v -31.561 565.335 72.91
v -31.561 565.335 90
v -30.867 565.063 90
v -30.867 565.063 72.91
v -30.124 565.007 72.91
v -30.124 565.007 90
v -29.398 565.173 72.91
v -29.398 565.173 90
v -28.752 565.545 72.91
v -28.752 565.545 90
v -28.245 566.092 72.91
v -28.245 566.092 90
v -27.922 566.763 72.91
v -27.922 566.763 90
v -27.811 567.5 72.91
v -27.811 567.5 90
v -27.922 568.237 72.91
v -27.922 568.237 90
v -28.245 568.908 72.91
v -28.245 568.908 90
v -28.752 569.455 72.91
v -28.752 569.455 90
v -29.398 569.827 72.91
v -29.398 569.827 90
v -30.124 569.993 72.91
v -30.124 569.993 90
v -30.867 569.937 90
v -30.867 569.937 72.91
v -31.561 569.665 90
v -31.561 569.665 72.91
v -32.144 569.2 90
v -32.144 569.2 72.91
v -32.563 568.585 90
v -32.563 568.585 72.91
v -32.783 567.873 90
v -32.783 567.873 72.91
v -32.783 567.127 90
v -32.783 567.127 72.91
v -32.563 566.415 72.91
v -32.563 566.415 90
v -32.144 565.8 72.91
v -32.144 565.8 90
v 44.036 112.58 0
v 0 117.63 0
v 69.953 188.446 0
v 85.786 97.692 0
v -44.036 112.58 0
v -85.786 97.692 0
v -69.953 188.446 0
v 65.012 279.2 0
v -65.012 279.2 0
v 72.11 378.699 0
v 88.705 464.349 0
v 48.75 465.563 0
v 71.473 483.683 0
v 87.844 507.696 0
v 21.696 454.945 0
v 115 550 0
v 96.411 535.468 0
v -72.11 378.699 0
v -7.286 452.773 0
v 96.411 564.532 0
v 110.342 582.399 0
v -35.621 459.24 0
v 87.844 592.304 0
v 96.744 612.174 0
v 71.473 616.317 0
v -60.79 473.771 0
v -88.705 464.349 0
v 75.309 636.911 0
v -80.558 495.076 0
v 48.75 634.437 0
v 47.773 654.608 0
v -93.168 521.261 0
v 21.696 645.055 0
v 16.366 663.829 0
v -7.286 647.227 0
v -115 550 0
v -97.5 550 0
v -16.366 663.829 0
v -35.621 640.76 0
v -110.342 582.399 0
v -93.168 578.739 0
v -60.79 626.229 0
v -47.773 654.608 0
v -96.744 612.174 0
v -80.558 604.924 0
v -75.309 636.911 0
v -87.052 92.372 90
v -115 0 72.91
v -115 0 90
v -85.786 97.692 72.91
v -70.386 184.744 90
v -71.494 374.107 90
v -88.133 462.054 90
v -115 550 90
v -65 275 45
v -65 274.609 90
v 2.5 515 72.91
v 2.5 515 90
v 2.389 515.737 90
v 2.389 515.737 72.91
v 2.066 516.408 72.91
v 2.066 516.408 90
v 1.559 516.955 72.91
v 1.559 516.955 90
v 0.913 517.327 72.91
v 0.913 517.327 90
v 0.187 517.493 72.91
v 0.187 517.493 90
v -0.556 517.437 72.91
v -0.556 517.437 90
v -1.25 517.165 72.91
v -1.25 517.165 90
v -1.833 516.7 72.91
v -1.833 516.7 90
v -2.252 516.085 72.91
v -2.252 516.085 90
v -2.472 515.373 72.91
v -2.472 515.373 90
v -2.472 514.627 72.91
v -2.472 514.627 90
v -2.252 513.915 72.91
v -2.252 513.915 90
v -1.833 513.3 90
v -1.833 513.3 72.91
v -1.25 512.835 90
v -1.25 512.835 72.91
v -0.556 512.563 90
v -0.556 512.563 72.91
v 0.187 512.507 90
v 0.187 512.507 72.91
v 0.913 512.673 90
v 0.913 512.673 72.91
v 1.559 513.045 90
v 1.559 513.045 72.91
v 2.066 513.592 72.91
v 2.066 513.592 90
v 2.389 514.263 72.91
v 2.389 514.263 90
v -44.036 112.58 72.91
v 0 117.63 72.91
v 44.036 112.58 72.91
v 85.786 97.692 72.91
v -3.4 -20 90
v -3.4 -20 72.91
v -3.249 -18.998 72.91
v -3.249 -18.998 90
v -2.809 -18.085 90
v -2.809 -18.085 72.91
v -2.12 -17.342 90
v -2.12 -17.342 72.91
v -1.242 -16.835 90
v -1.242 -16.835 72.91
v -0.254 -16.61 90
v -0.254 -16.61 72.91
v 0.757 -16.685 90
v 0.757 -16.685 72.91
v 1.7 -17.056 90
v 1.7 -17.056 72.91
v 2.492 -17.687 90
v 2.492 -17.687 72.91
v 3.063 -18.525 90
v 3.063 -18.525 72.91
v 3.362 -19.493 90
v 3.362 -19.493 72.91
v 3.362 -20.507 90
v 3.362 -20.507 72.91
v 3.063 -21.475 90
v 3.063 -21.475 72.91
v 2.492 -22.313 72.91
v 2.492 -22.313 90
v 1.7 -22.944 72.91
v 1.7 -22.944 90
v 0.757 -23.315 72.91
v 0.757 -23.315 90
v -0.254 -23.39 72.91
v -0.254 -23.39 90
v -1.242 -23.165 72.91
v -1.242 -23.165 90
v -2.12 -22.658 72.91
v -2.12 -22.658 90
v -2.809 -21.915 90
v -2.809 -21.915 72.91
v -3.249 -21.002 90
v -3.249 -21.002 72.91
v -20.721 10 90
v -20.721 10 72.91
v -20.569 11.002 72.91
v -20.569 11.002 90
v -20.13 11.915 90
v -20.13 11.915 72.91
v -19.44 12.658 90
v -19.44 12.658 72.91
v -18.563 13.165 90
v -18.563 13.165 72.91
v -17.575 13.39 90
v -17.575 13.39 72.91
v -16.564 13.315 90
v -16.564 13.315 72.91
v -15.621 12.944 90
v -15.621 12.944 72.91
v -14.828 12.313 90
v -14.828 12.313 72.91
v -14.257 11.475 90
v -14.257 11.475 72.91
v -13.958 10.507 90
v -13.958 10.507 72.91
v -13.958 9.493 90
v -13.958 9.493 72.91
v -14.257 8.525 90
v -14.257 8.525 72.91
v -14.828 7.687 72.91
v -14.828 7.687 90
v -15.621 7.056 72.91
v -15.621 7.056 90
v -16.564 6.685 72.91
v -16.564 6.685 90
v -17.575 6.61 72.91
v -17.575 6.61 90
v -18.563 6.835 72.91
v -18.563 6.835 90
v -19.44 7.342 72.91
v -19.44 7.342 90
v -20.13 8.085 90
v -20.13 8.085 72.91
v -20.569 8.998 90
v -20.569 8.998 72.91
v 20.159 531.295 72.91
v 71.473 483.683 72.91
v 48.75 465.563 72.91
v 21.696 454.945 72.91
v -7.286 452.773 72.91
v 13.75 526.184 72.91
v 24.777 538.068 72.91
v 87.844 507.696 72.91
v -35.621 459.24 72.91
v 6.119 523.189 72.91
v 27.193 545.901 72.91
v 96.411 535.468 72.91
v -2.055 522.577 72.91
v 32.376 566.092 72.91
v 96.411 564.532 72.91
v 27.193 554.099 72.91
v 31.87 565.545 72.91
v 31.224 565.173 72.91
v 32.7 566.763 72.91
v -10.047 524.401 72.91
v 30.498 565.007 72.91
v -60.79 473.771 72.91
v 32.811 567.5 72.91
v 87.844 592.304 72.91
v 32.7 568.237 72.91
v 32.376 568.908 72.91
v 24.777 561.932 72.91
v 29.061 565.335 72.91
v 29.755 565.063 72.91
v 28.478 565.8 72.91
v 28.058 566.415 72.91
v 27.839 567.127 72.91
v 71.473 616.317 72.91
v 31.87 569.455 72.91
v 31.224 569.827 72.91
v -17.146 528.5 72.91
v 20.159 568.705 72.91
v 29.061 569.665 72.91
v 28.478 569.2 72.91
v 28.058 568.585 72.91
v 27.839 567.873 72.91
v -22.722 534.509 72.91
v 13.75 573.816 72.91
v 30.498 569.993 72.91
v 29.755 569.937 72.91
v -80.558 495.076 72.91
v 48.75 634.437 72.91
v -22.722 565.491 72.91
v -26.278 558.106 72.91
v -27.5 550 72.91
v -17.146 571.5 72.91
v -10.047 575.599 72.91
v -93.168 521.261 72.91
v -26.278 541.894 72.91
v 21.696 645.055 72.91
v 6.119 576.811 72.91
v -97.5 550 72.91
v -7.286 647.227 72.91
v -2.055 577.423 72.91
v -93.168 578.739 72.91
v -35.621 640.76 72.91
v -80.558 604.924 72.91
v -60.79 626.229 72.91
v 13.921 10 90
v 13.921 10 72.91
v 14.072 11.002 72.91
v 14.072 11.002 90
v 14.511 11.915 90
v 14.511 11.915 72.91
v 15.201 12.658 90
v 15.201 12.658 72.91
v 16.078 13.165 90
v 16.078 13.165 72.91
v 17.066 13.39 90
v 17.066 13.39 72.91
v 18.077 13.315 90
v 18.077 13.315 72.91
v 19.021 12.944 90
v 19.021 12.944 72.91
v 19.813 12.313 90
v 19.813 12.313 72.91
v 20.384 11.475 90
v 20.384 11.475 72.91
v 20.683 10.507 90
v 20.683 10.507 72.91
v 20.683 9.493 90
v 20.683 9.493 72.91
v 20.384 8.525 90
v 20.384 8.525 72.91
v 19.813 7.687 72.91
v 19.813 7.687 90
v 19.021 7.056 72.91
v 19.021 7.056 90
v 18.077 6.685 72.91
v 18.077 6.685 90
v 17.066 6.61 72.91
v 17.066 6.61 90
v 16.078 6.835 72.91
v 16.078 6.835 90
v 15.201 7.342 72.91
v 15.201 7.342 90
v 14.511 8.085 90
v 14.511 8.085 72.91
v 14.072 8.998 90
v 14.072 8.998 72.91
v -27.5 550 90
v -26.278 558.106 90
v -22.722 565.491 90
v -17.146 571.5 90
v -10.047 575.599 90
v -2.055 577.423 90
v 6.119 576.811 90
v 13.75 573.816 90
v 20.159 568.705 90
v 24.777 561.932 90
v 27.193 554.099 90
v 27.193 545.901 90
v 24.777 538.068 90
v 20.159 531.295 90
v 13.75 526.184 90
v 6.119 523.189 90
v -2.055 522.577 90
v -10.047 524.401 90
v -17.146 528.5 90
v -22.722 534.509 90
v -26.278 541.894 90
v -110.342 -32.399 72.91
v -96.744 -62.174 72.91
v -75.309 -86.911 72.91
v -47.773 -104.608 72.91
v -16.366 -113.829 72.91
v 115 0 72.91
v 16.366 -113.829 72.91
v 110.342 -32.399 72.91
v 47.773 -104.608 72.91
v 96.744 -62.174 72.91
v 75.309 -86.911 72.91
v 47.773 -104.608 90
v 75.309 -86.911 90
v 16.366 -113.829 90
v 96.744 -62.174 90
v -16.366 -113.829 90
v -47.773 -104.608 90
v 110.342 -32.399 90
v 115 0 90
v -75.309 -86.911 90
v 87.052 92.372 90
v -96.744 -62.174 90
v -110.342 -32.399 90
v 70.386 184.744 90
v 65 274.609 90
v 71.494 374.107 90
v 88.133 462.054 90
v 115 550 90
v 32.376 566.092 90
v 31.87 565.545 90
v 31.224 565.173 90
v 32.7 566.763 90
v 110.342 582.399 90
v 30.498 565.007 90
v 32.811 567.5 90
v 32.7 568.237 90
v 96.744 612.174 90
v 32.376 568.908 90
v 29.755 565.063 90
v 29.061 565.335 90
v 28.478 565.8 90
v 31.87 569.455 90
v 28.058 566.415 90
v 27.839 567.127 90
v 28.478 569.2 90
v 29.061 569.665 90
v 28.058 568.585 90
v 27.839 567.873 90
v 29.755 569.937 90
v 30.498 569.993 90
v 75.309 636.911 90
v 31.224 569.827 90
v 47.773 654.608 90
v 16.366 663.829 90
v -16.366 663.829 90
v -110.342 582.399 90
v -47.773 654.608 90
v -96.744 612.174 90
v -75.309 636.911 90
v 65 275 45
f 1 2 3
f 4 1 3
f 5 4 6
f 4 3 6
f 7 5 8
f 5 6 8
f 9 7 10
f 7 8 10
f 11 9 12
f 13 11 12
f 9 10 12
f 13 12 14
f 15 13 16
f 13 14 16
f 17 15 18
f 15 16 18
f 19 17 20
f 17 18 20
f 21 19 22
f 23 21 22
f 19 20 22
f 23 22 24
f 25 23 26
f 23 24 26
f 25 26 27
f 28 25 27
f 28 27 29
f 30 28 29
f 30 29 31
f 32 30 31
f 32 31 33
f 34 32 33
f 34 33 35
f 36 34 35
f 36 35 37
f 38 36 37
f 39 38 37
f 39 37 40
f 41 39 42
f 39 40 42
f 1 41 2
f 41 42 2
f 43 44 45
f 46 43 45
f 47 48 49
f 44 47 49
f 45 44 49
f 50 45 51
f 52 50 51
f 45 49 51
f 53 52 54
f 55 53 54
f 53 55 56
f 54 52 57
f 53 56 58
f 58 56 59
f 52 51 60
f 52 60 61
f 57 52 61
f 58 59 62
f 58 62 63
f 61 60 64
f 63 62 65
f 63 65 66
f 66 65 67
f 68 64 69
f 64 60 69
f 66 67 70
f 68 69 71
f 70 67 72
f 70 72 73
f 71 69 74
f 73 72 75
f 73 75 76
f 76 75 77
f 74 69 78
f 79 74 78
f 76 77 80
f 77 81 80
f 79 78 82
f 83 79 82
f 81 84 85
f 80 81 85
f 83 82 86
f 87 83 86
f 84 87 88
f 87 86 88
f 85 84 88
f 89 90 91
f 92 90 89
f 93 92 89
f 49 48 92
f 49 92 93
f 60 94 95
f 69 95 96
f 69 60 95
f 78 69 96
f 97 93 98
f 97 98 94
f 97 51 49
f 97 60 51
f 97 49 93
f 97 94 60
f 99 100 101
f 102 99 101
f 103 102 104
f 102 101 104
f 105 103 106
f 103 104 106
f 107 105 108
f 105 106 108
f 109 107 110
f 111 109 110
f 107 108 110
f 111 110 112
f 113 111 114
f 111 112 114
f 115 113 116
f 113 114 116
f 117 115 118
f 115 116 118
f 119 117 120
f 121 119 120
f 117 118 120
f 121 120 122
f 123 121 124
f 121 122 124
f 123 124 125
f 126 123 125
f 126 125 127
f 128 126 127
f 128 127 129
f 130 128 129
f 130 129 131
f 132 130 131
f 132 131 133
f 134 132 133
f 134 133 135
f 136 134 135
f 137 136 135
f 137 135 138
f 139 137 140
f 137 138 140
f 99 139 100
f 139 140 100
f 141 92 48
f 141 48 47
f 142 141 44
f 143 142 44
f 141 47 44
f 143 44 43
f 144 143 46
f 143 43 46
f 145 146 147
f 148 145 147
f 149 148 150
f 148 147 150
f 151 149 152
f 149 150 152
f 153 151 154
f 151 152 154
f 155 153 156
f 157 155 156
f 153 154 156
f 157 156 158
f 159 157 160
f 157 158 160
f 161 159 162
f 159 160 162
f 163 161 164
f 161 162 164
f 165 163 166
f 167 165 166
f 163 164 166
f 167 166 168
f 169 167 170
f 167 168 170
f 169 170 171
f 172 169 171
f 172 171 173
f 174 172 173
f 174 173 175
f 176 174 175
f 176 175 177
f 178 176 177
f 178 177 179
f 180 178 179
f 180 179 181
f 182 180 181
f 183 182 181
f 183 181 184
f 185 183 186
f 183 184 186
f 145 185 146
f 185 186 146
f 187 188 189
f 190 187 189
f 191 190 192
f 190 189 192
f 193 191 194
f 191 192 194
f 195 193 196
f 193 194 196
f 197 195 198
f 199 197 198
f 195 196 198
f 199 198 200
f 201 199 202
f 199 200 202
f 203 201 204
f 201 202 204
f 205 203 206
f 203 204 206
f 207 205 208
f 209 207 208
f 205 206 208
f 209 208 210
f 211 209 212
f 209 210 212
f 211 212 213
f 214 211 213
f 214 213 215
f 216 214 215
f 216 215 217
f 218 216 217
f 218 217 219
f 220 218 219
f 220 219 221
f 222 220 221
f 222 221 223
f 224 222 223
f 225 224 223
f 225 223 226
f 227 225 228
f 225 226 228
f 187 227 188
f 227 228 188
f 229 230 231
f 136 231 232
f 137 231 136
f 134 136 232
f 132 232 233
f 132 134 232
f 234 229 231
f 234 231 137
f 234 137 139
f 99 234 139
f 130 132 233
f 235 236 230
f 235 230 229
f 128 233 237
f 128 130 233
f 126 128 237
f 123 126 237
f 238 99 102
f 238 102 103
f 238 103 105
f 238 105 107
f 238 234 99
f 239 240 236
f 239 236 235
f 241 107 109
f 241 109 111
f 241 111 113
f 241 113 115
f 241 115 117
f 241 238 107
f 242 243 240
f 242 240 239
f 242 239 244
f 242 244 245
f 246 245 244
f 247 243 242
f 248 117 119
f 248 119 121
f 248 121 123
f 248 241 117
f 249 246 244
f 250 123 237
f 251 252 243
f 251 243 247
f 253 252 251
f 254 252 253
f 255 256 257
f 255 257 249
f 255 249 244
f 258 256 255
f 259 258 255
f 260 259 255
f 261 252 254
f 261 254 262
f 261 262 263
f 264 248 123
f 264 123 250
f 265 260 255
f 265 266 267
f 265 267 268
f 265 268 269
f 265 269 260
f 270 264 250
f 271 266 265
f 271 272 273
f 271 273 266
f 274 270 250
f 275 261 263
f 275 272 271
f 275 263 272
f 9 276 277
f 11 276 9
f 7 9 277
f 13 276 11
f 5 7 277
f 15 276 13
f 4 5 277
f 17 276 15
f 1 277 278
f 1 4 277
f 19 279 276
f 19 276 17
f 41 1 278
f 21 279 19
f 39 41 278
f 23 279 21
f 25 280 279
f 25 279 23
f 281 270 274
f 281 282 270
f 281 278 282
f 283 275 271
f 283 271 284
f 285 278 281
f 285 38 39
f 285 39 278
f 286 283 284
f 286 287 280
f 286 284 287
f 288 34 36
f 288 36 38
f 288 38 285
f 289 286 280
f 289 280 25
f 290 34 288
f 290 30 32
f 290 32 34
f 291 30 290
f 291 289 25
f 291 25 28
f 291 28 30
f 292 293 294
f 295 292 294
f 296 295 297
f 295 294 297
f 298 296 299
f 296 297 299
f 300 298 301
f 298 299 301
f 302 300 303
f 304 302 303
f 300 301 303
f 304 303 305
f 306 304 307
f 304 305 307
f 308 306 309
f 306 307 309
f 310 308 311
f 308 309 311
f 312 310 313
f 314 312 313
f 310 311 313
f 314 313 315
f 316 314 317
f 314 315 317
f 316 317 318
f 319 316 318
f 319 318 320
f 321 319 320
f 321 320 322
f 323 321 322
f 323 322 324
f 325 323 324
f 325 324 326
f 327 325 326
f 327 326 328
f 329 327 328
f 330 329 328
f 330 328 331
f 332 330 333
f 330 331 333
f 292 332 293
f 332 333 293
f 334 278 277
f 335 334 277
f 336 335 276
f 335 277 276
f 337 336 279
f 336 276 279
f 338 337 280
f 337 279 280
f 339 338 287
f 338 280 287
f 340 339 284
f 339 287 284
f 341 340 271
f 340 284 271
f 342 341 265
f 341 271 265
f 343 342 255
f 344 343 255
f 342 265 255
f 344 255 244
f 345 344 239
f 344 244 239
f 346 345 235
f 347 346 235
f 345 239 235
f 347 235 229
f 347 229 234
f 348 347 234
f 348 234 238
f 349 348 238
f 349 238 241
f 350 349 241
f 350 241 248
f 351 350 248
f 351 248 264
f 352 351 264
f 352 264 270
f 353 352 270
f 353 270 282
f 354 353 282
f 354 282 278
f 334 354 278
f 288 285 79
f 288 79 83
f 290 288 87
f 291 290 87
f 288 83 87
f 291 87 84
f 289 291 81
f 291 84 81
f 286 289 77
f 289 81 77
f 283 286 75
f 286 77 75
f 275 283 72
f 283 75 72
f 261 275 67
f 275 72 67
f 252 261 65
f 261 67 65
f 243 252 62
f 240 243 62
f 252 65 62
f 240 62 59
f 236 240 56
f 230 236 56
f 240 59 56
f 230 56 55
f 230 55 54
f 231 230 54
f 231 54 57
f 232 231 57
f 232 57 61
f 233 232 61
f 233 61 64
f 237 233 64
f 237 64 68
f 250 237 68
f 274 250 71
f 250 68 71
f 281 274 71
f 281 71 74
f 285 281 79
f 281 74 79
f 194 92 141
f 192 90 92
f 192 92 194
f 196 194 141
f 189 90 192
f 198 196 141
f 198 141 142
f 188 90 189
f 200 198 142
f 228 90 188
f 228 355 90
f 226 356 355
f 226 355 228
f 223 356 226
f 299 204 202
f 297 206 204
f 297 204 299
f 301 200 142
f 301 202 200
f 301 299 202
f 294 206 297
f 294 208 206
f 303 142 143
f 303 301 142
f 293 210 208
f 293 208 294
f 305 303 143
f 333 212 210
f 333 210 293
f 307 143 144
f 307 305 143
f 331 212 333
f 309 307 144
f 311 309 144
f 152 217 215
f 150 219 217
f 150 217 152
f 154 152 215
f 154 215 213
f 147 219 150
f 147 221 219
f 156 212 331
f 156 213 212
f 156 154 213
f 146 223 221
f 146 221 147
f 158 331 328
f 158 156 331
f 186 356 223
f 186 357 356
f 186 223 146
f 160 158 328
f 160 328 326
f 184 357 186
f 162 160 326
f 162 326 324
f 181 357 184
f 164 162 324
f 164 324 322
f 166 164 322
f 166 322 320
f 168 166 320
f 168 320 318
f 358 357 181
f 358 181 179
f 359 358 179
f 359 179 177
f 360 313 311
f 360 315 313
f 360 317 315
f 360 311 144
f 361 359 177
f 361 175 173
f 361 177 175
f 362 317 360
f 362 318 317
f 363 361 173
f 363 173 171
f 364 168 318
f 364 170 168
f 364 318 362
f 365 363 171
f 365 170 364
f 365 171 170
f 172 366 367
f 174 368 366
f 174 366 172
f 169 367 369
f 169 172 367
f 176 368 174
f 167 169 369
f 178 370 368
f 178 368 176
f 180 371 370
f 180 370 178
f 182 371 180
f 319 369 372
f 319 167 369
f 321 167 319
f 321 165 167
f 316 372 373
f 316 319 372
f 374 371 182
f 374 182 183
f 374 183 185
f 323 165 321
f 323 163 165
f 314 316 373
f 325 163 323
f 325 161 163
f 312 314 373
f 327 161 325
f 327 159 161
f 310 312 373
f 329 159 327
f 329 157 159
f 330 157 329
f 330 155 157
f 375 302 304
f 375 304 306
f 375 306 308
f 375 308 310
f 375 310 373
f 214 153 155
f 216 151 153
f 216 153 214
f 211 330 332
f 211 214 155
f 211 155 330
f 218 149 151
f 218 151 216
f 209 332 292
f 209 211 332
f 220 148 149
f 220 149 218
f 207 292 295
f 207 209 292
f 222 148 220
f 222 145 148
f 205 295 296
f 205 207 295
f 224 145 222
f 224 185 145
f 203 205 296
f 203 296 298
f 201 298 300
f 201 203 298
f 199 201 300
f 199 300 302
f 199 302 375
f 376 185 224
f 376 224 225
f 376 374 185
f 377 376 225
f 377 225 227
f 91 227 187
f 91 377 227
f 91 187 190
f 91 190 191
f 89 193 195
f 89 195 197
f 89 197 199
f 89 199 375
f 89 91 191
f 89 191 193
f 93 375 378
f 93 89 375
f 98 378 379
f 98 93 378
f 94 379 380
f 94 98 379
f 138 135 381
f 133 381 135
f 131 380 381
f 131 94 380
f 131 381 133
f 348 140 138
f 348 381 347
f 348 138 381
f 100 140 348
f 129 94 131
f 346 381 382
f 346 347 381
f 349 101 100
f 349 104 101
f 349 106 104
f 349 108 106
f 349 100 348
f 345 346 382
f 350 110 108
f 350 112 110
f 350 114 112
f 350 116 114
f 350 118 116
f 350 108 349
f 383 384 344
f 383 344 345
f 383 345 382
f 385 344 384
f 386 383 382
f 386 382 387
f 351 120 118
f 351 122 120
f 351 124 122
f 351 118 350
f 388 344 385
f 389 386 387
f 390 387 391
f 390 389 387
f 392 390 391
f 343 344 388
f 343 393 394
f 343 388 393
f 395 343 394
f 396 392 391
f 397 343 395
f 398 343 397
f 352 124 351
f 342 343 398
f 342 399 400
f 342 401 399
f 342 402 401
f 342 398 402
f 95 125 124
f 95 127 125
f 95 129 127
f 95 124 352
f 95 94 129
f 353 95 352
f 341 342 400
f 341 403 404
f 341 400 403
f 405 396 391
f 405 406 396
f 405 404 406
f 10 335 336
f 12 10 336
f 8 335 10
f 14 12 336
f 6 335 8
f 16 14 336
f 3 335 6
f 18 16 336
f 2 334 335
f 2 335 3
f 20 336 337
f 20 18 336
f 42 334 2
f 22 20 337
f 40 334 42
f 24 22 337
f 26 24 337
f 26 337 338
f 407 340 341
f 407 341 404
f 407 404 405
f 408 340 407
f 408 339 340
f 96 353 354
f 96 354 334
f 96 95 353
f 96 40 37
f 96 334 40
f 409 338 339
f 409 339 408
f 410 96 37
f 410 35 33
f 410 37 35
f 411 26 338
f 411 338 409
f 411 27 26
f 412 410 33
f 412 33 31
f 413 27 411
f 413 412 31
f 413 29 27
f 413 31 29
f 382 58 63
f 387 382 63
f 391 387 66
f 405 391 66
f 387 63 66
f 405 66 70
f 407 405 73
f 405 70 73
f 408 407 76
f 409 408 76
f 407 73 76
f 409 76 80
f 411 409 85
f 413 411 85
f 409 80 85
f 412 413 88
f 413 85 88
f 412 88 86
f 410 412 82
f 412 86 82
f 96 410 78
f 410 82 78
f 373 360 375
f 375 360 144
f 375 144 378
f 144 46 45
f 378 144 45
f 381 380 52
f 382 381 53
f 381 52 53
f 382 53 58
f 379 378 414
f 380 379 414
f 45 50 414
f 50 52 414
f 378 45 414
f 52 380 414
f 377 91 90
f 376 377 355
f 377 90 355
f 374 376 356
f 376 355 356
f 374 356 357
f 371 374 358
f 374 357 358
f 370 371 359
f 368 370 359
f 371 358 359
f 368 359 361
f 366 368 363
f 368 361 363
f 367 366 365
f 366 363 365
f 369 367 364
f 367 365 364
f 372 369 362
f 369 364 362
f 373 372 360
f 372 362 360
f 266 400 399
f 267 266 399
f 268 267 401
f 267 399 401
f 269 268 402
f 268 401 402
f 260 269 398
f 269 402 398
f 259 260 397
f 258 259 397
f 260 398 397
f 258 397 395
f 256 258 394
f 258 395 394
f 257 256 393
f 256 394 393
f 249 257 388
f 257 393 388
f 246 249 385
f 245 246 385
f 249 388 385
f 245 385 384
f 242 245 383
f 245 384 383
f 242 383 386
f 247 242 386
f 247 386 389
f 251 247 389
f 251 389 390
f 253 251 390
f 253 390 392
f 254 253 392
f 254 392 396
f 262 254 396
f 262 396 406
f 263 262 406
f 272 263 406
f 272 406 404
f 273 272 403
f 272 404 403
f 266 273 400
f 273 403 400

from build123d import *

# Parameters (mm, degrees)
BOSS_EXTRUDE1_DEPTH = 90
SKETCH2_R           = 97.5
CUT_EXTRUDE1_DEPTH  = 72.91
SKETCH6_R           = 97.5
CUT_EXTRUDE5_DEPTH  = 72.91
SKETCH7_R           = 27.5
CUT_EXTRUDE6_DEPTH  = 72.91
CUT_EXTRUDE10_DEPTH = 72.91
SKETCH13_R          = 3.4
CUT_EXTRUDE13_DEPTH = 17.09
SKETCH14_R          = 2.5
CUT_EXTRUDE14_DEPTH = 17.09
CIRPATTERN1_COUNT   = 3


with BuildPart() as part:
    # Sketch1 → Boss-Extrude1 (new body)
    with BuildSketch(Plane(origin=(0, 0, 0), x_dir=(0, 1, 0), z_dir=(0, 0, 1))):
        with BuildLine():
            ThreePointArc((0, 115), (-115, 0), (0, -115))
            add(Edge.make_bspline(
                [(0, -115), (275, -15), (550, -115)],
                knots=[0, 0, 0, 1, 1, 1], degree=2))
            ThreePointArc((550, -115), (665, 0), (550, 115))
            add(Edge.make_bspline(
                [(0, 115), (275, 15), (550, 115)],
                knots=[0, 0, 0, 1, 1, 1], degree=2))
        make_face()
    extrude(amount=BOSS_EXTRUDE1_DEPTH)

    # Sketch2 → Cut-Extrude1 (cut)
    with BuildSketch(Plane(origin=(0, 0, 0), x_dir=(1, 0, 0), z_dir=(0, 0, -1))):
        with Locations(Location((0, 0, 0), (0, 0, 180))):
            Circle(SKETCH2_R)
    extrude(amount=-CUT_EXTRUDE1_DEPTH, mode=Mode.SUBTRACT)

    # Sketch6 → Cut-Extrude5 (cut)
    with BuildSketch(Plane(origin=(0, 0, 0), x_dir=(1, 0, 0), z_dir=(0, 0, -1))):
        with Locations(Location((0, -550, 0), (0, 0, 180))):
            Circle(SKETCH6_R)
    extrude(amount=-CUT_EXTRUDE5_DEPTH, mode=Mode.SUBTRACT)

    # Sketch7 → Cut-Extrude6 (cut)
    with BuildSketch(Plane(origin=(0, 0, 72.91), x_dir=(1, 0, 0), z_dir=(0, 0, -1))):
        with Locations(Location((0, -550, 0), (0, 0, 180))):
            Circle(SKETCH7_R)
    extrude(amount=-CUT_EXTRUDE6_DEPTH, mode=Mode.SUBTRACT)

    # Sketch10 → Cut-Extrude10 (cut)
    with BuildSketch(Plane(origin=(0, 0, 0), x_dir=(1, 0, 0), z_dir=(0, 0, -1))):
        with BuildLine():
            ThreePointArc((115, 0), (0, 115), (-115, 0))
            add(Edge.make_bspline(
                [(-85.785633537, -97.691594321), (-97.237891942, -48.84579716), (-115, 0)],
                knots=[0, 0, 0, 1, 1, 1], degree=2))
            ThreePointArc((-85.785633537, -97.691594321), (0, -117.630315166), (85.785633537, -97.691594321))
            add(Edge.make_bspline(
                [(115, 0), (97.237891942, -48.84579716), (85.785633537, -97.691594321)],
                knots=[0, 0, 0, 1, 1, 1], degree=2))
        make_face()
    extrude(amount=-CUT_EXTRUDE10_DEPTH, mode=Mode.SUBTRACT)

    # Sketch13 → Cut-Extrude13 (cut)
    with BuildSketch(Plane(origin=(0, 0, 72.91), x_dir=(1, 0, 0), z_dir=(0, 0, -1))):
        with Locations(Location((0, 20, 0), (0, 0, 180))):
            Circle(SKETCH13_R)
        with Locations(Location((-17.320508076, -10, 0), (0, 0, 180))):
            Circle(SKETCH13_R)
        with Locations(Location((17.320508076, -10, 0), (0, 0, 180))):
            Circle(SKETCH13_R)
    extrude(amount=-CUT_EXTRUDE13_DEPTH, mode=Mode.SUBTRACT)

    # Sketch14 → Cut-Extrude14 (cut)
    with BuildSketch(Plane.XY.offset(90)):
        with Locations((0, 515)):
            Circle(SKETCH14_R)
    cut_extrude14 = extrude(amount=-CUT_EXTRUDE14_DEPTH, mode=Mode.SUBTRACT)

    # CirPattern1: Cut-Extrude14 ×3 about axis
    cirpattern1_axis = Axis((0, 550, 0), (0, 0, 1))
    for i in range(1, CIRPATTERN1_COUNT):
        add(cut_extrude14.rotate(cirpattern1_axis, i * 360 / CIRPATTERN1_COUNT), mode=Mode.SUBTRACT)


solid = part.part
